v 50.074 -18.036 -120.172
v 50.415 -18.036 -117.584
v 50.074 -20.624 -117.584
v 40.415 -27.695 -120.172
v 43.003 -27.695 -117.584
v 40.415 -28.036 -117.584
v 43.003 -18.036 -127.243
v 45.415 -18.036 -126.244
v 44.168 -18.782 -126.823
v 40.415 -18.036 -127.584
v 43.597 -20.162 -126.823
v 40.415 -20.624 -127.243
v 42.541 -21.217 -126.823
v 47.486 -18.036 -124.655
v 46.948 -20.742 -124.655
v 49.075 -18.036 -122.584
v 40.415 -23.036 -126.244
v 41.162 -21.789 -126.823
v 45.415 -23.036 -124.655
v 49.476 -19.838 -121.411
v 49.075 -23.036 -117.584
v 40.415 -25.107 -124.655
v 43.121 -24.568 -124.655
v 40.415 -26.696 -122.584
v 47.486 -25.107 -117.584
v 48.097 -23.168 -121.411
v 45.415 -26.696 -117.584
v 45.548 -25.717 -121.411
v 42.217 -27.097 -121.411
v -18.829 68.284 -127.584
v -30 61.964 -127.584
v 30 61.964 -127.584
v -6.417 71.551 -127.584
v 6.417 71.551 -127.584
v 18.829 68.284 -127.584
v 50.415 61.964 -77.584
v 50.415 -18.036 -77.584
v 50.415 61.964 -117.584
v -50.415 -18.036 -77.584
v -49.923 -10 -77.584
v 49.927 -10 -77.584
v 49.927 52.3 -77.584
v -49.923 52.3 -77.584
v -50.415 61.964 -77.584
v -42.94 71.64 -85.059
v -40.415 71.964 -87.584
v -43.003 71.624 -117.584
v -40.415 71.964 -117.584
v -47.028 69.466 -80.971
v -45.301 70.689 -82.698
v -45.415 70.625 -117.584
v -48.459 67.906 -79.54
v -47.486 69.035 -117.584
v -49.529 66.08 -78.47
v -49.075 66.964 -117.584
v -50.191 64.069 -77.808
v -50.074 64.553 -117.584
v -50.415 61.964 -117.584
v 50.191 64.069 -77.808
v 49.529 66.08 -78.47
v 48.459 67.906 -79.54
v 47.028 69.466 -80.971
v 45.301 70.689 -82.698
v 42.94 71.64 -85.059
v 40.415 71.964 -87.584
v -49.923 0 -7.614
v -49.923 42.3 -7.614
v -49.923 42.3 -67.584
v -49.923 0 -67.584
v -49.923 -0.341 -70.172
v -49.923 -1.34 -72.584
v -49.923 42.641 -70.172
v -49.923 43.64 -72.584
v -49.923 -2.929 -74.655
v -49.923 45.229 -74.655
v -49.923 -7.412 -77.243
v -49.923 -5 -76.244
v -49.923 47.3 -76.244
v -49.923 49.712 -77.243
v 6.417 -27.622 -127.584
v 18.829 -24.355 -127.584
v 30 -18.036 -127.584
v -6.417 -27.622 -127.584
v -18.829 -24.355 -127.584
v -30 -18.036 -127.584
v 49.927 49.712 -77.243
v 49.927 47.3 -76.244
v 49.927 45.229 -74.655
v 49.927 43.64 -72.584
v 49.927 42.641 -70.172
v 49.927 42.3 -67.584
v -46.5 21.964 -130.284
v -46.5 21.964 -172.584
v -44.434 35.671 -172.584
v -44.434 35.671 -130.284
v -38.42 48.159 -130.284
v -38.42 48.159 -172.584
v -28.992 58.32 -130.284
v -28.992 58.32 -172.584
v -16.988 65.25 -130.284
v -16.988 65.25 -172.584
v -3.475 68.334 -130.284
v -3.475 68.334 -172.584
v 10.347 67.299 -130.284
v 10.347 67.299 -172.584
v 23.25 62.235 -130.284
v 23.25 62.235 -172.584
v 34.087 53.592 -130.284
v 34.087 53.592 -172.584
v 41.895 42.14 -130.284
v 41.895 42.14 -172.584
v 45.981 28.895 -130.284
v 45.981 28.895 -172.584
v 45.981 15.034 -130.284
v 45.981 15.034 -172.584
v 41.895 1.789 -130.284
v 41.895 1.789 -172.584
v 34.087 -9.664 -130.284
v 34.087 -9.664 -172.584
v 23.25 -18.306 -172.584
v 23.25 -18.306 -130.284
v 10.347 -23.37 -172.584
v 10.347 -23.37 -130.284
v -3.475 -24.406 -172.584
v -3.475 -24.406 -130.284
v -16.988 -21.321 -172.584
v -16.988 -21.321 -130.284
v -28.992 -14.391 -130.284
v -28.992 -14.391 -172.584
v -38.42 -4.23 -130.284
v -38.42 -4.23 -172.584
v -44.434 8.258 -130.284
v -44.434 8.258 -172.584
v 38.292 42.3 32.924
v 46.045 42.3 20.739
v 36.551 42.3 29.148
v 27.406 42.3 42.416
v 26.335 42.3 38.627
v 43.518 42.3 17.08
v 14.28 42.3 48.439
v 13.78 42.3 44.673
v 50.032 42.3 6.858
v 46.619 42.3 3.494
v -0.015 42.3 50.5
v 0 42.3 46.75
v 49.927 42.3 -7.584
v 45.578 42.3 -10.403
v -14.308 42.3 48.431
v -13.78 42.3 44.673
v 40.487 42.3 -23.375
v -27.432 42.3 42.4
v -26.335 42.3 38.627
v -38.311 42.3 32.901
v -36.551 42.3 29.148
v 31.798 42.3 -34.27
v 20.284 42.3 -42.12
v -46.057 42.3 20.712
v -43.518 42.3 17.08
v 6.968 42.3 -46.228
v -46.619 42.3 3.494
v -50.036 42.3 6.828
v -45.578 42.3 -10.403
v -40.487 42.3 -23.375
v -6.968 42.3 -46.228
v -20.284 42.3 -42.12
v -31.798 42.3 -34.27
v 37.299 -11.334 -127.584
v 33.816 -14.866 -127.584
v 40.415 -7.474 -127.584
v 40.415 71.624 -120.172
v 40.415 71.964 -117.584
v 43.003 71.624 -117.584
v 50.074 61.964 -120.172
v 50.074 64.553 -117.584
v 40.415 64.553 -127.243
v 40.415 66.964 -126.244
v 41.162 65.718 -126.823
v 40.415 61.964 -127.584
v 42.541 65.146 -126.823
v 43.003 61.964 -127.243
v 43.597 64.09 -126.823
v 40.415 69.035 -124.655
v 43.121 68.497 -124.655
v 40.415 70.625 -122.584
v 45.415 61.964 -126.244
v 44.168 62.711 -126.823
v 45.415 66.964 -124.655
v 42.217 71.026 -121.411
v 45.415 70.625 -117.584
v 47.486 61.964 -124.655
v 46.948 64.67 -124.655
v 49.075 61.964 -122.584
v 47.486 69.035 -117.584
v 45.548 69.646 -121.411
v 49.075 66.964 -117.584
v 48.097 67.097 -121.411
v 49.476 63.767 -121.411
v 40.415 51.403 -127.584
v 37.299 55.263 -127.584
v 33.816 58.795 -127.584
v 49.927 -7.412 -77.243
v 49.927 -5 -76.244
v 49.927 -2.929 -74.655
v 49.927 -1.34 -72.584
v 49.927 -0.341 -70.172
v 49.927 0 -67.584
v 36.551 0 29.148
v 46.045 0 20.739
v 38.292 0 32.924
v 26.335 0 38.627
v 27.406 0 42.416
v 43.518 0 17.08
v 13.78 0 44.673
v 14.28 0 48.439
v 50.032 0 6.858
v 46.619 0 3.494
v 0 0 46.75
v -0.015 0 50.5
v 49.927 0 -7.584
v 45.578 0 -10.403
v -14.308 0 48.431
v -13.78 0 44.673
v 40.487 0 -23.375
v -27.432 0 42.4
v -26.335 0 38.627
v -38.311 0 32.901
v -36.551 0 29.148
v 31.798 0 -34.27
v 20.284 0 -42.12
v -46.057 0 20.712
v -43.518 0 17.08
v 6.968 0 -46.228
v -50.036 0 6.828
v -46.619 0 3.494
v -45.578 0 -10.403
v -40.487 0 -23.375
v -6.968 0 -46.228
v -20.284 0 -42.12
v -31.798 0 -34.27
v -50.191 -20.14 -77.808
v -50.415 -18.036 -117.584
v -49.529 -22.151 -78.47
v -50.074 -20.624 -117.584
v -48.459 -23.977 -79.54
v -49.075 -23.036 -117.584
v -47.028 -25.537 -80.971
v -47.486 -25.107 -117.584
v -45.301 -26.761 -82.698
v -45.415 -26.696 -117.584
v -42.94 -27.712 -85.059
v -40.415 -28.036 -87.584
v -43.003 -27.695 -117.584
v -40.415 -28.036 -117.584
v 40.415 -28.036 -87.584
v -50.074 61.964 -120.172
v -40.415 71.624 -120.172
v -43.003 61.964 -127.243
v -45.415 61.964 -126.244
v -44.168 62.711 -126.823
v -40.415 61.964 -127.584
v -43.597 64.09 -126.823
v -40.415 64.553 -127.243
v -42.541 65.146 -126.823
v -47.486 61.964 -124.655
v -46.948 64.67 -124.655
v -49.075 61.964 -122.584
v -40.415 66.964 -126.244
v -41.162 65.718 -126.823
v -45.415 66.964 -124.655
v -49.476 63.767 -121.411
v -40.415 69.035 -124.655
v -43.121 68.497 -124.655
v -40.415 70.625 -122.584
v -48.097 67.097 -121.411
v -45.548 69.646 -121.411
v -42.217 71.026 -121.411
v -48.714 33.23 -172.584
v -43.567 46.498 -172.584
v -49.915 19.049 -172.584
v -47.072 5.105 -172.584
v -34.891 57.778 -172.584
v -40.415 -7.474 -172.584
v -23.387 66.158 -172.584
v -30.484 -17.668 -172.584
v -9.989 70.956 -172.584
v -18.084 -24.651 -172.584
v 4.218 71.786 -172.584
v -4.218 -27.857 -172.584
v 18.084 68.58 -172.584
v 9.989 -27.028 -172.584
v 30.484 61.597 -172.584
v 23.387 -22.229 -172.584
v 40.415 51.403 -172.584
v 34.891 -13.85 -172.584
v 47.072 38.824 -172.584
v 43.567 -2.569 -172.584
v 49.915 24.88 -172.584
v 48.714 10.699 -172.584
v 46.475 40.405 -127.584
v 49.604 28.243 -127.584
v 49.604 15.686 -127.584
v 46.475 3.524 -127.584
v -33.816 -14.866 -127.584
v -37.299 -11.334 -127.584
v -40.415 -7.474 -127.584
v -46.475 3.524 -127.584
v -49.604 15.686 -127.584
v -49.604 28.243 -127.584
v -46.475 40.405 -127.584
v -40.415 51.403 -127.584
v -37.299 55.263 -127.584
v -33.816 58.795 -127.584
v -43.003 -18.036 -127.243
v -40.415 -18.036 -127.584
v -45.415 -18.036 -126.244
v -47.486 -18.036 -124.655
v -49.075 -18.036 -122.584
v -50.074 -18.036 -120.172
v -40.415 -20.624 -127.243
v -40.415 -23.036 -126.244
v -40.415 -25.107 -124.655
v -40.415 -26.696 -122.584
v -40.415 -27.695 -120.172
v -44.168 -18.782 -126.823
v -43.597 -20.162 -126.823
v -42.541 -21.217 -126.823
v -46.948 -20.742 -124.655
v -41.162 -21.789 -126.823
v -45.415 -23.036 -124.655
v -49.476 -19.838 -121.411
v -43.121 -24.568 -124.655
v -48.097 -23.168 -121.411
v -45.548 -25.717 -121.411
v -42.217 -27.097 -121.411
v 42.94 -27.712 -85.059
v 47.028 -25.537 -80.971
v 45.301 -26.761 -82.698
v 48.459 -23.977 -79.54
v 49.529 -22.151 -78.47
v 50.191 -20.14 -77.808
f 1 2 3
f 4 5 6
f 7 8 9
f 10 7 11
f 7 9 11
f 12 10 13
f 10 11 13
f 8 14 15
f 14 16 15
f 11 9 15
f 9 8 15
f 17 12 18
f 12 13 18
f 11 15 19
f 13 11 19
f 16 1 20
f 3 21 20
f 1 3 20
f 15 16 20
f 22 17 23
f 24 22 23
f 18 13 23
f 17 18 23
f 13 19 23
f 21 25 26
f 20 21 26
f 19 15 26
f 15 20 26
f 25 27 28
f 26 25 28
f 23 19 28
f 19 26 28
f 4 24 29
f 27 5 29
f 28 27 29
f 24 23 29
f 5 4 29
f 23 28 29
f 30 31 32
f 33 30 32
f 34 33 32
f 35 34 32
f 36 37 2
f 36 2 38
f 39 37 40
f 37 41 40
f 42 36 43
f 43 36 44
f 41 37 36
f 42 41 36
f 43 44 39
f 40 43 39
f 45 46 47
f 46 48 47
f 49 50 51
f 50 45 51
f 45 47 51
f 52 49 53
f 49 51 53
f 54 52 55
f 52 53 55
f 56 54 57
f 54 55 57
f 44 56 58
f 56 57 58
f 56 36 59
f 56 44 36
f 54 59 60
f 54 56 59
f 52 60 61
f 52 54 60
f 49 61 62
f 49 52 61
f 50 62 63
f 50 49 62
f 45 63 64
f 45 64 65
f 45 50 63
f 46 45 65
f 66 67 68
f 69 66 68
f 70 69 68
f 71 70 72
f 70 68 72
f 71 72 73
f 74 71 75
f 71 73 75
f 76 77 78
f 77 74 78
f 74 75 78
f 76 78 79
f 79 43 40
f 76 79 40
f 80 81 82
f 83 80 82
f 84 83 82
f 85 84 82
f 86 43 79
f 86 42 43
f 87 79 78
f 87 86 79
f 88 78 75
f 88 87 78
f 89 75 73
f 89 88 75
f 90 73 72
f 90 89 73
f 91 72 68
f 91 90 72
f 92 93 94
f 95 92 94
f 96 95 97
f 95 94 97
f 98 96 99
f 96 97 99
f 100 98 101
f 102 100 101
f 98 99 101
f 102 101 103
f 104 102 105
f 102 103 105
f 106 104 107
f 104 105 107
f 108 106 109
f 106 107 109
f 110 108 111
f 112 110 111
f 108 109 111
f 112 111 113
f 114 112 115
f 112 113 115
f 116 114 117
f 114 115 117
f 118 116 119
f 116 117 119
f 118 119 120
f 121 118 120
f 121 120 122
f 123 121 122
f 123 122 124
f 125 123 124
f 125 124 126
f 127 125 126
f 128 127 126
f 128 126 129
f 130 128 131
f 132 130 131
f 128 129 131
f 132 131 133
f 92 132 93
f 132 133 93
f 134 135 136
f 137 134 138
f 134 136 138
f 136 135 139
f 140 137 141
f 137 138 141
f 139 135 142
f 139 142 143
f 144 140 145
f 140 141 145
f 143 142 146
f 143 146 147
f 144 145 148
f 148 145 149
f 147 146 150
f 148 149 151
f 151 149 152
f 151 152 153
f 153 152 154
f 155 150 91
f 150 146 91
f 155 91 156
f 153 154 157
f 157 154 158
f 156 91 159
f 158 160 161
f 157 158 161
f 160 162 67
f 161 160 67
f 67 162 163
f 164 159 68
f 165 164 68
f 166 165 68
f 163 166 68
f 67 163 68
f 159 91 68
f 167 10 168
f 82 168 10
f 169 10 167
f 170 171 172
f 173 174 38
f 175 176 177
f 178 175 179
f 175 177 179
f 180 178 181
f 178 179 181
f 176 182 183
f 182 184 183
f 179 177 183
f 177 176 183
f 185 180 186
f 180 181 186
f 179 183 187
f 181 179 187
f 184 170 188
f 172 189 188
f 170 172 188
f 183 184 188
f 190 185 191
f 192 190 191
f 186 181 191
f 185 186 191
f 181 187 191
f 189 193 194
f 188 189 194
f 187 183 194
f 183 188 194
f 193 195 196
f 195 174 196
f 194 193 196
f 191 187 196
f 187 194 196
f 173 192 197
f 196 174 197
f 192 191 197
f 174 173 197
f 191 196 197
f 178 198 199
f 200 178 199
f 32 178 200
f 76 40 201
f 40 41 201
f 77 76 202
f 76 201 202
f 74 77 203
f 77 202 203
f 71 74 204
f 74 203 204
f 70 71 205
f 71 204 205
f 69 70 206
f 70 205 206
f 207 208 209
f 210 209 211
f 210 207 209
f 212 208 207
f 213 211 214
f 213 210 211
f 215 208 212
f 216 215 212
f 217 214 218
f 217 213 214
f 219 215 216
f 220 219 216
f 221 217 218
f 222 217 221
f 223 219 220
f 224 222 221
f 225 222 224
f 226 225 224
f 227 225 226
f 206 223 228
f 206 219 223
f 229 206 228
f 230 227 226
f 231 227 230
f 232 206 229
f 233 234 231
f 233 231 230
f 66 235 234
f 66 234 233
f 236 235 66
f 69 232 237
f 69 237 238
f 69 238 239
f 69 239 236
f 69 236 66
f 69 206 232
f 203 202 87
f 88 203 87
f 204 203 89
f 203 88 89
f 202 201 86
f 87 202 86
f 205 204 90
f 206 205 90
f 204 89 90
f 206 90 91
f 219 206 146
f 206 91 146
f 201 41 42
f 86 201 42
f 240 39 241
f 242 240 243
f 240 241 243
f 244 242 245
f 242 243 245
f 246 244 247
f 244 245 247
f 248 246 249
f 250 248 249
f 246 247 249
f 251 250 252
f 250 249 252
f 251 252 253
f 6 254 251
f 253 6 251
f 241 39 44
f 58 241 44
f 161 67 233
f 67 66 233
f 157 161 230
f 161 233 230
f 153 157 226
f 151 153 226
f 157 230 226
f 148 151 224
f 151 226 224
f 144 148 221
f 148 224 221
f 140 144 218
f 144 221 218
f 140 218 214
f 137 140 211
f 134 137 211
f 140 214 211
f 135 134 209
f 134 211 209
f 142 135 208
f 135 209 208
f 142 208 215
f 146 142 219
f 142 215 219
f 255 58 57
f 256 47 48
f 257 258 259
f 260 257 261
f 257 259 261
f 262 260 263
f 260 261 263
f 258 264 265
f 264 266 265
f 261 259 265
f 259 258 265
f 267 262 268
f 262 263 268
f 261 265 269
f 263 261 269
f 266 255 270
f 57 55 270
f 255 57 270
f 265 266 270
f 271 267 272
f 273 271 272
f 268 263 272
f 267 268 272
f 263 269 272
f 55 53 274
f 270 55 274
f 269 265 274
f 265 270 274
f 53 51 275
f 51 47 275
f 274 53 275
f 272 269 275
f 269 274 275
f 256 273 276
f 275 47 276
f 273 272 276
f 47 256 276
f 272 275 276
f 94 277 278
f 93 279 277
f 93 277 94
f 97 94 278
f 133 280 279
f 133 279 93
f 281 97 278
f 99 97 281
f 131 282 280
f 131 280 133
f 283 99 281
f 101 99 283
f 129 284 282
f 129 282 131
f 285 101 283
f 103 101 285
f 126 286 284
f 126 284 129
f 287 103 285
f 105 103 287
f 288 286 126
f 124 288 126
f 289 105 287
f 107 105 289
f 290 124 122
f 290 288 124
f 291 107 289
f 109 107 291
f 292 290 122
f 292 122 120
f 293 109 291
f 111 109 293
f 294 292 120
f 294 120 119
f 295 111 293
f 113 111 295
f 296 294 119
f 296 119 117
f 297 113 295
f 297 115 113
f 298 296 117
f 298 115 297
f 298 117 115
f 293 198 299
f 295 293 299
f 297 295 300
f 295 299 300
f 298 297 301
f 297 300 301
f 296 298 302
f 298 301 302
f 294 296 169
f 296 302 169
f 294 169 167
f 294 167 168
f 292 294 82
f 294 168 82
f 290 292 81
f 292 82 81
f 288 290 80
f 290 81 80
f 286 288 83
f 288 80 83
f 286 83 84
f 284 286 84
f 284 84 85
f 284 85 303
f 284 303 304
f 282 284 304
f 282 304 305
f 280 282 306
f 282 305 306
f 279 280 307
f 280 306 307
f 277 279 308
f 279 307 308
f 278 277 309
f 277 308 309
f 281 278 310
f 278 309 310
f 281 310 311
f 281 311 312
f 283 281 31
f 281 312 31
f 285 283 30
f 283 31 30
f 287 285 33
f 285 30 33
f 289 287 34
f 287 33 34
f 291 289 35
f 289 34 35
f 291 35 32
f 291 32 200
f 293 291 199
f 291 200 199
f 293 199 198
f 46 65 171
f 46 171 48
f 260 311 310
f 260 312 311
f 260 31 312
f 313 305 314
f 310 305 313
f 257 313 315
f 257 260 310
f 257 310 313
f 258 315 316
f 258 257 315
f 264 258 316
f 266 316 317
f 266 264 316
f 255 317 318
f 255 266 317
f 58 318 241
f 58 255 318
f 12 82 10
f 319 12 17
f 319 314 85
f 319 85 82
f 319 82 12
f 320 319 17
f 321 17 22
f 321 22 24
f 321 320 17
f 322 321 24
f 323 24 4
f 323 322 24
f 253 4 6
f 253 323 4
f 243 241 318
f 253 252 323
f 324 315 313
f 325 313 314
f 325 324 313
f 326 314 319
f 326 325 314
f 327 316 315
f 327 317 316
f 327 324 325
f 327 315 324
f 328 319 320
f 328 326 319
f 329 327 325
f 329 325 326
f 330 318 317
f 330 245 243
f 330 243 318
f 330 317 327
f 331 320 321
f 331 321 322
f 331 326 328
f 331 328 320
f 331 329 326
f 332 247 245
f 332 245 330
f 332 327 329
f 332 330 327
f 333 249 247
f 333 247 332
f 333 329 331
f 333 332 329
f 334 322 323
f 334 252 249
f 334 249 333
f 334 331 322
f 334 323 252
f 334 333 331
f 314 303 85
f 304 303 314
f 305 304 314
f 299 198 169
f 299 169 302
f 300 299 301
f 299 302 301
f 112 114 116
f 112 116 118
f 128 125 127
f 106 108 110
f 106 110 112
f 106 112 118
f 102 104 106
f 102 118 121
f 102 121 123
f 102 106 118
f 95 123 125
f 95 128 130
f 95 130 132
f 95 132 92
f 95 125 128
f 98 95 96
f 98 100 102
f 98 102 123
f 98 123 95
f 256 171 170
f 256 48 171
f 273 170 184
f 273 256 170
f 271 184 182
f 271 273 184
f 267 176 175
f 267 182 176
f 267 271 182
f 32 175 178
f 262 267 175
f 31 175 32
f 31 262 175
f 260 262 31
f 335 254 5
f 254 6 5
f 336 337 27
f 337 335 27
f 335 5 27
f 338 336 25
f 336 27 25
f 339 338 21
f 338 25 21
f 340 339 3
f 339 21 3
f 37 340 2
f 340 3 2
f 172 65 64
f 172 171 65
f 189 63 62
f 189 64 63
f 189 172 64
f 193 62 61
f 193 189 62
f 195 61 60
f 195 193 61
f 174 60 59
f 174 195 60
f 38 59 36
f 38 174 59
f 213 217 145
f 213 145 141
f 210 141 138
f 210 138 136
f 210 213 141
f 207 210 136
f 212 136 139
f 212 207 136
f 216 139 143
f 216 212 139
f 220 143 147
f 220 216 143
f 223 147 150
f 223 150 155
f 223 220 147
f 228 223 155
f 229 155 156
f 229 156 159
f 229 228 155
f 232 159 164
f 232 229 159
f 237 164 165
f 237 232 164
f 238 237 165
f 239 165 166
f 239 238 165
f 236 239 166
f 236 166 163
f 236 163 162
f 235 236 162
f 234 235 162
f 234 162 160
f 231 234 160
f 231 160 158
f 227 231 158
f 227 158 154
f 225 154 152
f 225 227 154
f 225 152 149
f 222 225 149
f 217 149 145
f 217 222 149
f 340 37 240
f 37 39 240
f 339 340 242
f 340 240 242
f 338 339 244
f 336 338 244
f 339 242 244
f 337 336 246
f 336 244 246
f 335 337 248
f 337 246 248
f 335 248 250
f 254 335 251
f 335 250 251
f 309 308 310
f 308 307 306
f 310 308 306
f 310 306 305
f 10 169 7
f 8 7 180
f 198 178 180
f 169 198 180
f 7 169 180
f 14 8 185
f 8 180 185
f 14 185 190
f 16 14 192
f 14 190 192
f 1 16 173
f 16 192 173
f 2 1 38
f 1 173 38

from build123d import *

# Parameters (mm, degrees)
SKETCH_1_R          = 50.5
SKETCH_1_R_2        = 46.75
EXTRUDE_1_DEPTH     = 42.3
EXTRUDE_3_DEPTH     = 42.3
SKETCH_10_W         = 100.829972986
SKETCH_10_H         = 100
EXTRUDE_6_DEPTH     = 50
FILLET_13_R         = 10
FILLET_14_R         = 10
SKETCH_11_R         = 50
EXTRUDE_7_DEPTH     = 45
SKETCH_12_R         = 46.5
CUT_EXTRUDE_1_DEPTH = 42.3


with BuildPart() as part:
    # 草图1 → 凸台-拉伸1 (new body)
    with BuildSketch(Plane(origin=(0, 0, 0), x_dir=(1, 0, 0), z_dir=(0, 1, 0))):
        with Locations(Location((0, 0, 0), (0, 0, 270))):
            Circle(SKETCH_1_R)
        with Locations(Location((0, 0, 0), (0, 0, 270))):
            Circle(SKETCH_1_R_2, mode=Mode.SUBTRACT)
    extrude(amount=EXTRUDE_1_DEPTH)

    # 草图2 → 凸台-拉伸3 (add)
    with BuildSketch(Plane(origin=(0, 42.3, 0), x_dir=(1, 0, 0), z_dir=(0, 1, 0))):
        with BuildLine():
            Line((-49.922748528, 77.584165112), (49.927251472, 77.584165112))
            Line((49.927251472, 77.584165112), (49.927251472, 7.584165112))
            ThreePointArc((49.927251472, 7.584165112), (0.002251472, 49.671200662), (-49.922748528, 7.584165112))
            Line((-49.922748528, 7.584165112), (-49.922748528, 77.584165112))
        make_face()
    extrude(amount=-EXTRUDE_3_DEPTH)

    # 草图10 → 凸台-拉伸6 (add)
    with BuildSketch(Plane(origin=(0, 0, -77.584165112), x_dir=(-1, 0, 0), z_dir=(0, 0, -1))):
        with Locations((0, 21.964414078)):
            Rectangle(SKETCH_10_W, SKETCH_10_H)
    extrude(amount=EXTRUDE_6_DEPTH)

    # 圆角13
    fillet_13_edges = [part.edges().sort_by_distance(p)[0] for p in [
        (0.002251472, 0, -77.584165112),
        (0.002251472, 42.3, -77.584165112),
    ]]
    fillet(fillet_13_edges, radius=FILLET_13_R)

    # 圆角14
    fillet_14_edges = [part.edges().sort_by_distance(p)[0] for p in [
        (-50.414986493, -28.035585922, -102.584165112),
        (0, 71.964414078, -77.584165112),
        (-50.414986493, 71.964414078, -102.584165112),
        (50.414986493, 71.964414078, -102.584165112),
        (0, -28.035585922, -77.584165112),
        (50.414986493, -28.035585922, -102.584165112),
        (-50.414986493, 21.964414078, -127.584165112),
        (0, 71.964414078, -127.584165112),
        (50.414986493, 21.964414078, -127.584165112),
        (0, -28.035585922, -127.584165112),
    ]]
    fillet(fillet_14_edges, radius=FILLET_14_R)

    # 草图11 → 凸台-拉伸7 (add)
    with BuildSketch(Plane(origin=(0, 0, -127.584165112), x_dir=(-1, 0, 0), z_dir=(0, 0, -1))):
        with Locations(Location((0, 21.964414078, 0), (0, 0, 143.930141518))):
            Circle(SKETCH_11_R)
    extrude(amount=EXTRUDE_7_DEPTH)

    # 草图12 → 切除-拉伸1 (cut)
    with BuildSketch(Plane(origin=(0, 0, -172.584165112), x_dir=(-1, 0, 0), z_dir=(0, 0, -1))):
        with Locations((0, 21.964414078)):
            Circle(SKETCH_12_R)
    extrude(amount=-CUT_EXTRUDE_1_DEPTH, mode=Mode.SUBTRACT)


solid = part.part
